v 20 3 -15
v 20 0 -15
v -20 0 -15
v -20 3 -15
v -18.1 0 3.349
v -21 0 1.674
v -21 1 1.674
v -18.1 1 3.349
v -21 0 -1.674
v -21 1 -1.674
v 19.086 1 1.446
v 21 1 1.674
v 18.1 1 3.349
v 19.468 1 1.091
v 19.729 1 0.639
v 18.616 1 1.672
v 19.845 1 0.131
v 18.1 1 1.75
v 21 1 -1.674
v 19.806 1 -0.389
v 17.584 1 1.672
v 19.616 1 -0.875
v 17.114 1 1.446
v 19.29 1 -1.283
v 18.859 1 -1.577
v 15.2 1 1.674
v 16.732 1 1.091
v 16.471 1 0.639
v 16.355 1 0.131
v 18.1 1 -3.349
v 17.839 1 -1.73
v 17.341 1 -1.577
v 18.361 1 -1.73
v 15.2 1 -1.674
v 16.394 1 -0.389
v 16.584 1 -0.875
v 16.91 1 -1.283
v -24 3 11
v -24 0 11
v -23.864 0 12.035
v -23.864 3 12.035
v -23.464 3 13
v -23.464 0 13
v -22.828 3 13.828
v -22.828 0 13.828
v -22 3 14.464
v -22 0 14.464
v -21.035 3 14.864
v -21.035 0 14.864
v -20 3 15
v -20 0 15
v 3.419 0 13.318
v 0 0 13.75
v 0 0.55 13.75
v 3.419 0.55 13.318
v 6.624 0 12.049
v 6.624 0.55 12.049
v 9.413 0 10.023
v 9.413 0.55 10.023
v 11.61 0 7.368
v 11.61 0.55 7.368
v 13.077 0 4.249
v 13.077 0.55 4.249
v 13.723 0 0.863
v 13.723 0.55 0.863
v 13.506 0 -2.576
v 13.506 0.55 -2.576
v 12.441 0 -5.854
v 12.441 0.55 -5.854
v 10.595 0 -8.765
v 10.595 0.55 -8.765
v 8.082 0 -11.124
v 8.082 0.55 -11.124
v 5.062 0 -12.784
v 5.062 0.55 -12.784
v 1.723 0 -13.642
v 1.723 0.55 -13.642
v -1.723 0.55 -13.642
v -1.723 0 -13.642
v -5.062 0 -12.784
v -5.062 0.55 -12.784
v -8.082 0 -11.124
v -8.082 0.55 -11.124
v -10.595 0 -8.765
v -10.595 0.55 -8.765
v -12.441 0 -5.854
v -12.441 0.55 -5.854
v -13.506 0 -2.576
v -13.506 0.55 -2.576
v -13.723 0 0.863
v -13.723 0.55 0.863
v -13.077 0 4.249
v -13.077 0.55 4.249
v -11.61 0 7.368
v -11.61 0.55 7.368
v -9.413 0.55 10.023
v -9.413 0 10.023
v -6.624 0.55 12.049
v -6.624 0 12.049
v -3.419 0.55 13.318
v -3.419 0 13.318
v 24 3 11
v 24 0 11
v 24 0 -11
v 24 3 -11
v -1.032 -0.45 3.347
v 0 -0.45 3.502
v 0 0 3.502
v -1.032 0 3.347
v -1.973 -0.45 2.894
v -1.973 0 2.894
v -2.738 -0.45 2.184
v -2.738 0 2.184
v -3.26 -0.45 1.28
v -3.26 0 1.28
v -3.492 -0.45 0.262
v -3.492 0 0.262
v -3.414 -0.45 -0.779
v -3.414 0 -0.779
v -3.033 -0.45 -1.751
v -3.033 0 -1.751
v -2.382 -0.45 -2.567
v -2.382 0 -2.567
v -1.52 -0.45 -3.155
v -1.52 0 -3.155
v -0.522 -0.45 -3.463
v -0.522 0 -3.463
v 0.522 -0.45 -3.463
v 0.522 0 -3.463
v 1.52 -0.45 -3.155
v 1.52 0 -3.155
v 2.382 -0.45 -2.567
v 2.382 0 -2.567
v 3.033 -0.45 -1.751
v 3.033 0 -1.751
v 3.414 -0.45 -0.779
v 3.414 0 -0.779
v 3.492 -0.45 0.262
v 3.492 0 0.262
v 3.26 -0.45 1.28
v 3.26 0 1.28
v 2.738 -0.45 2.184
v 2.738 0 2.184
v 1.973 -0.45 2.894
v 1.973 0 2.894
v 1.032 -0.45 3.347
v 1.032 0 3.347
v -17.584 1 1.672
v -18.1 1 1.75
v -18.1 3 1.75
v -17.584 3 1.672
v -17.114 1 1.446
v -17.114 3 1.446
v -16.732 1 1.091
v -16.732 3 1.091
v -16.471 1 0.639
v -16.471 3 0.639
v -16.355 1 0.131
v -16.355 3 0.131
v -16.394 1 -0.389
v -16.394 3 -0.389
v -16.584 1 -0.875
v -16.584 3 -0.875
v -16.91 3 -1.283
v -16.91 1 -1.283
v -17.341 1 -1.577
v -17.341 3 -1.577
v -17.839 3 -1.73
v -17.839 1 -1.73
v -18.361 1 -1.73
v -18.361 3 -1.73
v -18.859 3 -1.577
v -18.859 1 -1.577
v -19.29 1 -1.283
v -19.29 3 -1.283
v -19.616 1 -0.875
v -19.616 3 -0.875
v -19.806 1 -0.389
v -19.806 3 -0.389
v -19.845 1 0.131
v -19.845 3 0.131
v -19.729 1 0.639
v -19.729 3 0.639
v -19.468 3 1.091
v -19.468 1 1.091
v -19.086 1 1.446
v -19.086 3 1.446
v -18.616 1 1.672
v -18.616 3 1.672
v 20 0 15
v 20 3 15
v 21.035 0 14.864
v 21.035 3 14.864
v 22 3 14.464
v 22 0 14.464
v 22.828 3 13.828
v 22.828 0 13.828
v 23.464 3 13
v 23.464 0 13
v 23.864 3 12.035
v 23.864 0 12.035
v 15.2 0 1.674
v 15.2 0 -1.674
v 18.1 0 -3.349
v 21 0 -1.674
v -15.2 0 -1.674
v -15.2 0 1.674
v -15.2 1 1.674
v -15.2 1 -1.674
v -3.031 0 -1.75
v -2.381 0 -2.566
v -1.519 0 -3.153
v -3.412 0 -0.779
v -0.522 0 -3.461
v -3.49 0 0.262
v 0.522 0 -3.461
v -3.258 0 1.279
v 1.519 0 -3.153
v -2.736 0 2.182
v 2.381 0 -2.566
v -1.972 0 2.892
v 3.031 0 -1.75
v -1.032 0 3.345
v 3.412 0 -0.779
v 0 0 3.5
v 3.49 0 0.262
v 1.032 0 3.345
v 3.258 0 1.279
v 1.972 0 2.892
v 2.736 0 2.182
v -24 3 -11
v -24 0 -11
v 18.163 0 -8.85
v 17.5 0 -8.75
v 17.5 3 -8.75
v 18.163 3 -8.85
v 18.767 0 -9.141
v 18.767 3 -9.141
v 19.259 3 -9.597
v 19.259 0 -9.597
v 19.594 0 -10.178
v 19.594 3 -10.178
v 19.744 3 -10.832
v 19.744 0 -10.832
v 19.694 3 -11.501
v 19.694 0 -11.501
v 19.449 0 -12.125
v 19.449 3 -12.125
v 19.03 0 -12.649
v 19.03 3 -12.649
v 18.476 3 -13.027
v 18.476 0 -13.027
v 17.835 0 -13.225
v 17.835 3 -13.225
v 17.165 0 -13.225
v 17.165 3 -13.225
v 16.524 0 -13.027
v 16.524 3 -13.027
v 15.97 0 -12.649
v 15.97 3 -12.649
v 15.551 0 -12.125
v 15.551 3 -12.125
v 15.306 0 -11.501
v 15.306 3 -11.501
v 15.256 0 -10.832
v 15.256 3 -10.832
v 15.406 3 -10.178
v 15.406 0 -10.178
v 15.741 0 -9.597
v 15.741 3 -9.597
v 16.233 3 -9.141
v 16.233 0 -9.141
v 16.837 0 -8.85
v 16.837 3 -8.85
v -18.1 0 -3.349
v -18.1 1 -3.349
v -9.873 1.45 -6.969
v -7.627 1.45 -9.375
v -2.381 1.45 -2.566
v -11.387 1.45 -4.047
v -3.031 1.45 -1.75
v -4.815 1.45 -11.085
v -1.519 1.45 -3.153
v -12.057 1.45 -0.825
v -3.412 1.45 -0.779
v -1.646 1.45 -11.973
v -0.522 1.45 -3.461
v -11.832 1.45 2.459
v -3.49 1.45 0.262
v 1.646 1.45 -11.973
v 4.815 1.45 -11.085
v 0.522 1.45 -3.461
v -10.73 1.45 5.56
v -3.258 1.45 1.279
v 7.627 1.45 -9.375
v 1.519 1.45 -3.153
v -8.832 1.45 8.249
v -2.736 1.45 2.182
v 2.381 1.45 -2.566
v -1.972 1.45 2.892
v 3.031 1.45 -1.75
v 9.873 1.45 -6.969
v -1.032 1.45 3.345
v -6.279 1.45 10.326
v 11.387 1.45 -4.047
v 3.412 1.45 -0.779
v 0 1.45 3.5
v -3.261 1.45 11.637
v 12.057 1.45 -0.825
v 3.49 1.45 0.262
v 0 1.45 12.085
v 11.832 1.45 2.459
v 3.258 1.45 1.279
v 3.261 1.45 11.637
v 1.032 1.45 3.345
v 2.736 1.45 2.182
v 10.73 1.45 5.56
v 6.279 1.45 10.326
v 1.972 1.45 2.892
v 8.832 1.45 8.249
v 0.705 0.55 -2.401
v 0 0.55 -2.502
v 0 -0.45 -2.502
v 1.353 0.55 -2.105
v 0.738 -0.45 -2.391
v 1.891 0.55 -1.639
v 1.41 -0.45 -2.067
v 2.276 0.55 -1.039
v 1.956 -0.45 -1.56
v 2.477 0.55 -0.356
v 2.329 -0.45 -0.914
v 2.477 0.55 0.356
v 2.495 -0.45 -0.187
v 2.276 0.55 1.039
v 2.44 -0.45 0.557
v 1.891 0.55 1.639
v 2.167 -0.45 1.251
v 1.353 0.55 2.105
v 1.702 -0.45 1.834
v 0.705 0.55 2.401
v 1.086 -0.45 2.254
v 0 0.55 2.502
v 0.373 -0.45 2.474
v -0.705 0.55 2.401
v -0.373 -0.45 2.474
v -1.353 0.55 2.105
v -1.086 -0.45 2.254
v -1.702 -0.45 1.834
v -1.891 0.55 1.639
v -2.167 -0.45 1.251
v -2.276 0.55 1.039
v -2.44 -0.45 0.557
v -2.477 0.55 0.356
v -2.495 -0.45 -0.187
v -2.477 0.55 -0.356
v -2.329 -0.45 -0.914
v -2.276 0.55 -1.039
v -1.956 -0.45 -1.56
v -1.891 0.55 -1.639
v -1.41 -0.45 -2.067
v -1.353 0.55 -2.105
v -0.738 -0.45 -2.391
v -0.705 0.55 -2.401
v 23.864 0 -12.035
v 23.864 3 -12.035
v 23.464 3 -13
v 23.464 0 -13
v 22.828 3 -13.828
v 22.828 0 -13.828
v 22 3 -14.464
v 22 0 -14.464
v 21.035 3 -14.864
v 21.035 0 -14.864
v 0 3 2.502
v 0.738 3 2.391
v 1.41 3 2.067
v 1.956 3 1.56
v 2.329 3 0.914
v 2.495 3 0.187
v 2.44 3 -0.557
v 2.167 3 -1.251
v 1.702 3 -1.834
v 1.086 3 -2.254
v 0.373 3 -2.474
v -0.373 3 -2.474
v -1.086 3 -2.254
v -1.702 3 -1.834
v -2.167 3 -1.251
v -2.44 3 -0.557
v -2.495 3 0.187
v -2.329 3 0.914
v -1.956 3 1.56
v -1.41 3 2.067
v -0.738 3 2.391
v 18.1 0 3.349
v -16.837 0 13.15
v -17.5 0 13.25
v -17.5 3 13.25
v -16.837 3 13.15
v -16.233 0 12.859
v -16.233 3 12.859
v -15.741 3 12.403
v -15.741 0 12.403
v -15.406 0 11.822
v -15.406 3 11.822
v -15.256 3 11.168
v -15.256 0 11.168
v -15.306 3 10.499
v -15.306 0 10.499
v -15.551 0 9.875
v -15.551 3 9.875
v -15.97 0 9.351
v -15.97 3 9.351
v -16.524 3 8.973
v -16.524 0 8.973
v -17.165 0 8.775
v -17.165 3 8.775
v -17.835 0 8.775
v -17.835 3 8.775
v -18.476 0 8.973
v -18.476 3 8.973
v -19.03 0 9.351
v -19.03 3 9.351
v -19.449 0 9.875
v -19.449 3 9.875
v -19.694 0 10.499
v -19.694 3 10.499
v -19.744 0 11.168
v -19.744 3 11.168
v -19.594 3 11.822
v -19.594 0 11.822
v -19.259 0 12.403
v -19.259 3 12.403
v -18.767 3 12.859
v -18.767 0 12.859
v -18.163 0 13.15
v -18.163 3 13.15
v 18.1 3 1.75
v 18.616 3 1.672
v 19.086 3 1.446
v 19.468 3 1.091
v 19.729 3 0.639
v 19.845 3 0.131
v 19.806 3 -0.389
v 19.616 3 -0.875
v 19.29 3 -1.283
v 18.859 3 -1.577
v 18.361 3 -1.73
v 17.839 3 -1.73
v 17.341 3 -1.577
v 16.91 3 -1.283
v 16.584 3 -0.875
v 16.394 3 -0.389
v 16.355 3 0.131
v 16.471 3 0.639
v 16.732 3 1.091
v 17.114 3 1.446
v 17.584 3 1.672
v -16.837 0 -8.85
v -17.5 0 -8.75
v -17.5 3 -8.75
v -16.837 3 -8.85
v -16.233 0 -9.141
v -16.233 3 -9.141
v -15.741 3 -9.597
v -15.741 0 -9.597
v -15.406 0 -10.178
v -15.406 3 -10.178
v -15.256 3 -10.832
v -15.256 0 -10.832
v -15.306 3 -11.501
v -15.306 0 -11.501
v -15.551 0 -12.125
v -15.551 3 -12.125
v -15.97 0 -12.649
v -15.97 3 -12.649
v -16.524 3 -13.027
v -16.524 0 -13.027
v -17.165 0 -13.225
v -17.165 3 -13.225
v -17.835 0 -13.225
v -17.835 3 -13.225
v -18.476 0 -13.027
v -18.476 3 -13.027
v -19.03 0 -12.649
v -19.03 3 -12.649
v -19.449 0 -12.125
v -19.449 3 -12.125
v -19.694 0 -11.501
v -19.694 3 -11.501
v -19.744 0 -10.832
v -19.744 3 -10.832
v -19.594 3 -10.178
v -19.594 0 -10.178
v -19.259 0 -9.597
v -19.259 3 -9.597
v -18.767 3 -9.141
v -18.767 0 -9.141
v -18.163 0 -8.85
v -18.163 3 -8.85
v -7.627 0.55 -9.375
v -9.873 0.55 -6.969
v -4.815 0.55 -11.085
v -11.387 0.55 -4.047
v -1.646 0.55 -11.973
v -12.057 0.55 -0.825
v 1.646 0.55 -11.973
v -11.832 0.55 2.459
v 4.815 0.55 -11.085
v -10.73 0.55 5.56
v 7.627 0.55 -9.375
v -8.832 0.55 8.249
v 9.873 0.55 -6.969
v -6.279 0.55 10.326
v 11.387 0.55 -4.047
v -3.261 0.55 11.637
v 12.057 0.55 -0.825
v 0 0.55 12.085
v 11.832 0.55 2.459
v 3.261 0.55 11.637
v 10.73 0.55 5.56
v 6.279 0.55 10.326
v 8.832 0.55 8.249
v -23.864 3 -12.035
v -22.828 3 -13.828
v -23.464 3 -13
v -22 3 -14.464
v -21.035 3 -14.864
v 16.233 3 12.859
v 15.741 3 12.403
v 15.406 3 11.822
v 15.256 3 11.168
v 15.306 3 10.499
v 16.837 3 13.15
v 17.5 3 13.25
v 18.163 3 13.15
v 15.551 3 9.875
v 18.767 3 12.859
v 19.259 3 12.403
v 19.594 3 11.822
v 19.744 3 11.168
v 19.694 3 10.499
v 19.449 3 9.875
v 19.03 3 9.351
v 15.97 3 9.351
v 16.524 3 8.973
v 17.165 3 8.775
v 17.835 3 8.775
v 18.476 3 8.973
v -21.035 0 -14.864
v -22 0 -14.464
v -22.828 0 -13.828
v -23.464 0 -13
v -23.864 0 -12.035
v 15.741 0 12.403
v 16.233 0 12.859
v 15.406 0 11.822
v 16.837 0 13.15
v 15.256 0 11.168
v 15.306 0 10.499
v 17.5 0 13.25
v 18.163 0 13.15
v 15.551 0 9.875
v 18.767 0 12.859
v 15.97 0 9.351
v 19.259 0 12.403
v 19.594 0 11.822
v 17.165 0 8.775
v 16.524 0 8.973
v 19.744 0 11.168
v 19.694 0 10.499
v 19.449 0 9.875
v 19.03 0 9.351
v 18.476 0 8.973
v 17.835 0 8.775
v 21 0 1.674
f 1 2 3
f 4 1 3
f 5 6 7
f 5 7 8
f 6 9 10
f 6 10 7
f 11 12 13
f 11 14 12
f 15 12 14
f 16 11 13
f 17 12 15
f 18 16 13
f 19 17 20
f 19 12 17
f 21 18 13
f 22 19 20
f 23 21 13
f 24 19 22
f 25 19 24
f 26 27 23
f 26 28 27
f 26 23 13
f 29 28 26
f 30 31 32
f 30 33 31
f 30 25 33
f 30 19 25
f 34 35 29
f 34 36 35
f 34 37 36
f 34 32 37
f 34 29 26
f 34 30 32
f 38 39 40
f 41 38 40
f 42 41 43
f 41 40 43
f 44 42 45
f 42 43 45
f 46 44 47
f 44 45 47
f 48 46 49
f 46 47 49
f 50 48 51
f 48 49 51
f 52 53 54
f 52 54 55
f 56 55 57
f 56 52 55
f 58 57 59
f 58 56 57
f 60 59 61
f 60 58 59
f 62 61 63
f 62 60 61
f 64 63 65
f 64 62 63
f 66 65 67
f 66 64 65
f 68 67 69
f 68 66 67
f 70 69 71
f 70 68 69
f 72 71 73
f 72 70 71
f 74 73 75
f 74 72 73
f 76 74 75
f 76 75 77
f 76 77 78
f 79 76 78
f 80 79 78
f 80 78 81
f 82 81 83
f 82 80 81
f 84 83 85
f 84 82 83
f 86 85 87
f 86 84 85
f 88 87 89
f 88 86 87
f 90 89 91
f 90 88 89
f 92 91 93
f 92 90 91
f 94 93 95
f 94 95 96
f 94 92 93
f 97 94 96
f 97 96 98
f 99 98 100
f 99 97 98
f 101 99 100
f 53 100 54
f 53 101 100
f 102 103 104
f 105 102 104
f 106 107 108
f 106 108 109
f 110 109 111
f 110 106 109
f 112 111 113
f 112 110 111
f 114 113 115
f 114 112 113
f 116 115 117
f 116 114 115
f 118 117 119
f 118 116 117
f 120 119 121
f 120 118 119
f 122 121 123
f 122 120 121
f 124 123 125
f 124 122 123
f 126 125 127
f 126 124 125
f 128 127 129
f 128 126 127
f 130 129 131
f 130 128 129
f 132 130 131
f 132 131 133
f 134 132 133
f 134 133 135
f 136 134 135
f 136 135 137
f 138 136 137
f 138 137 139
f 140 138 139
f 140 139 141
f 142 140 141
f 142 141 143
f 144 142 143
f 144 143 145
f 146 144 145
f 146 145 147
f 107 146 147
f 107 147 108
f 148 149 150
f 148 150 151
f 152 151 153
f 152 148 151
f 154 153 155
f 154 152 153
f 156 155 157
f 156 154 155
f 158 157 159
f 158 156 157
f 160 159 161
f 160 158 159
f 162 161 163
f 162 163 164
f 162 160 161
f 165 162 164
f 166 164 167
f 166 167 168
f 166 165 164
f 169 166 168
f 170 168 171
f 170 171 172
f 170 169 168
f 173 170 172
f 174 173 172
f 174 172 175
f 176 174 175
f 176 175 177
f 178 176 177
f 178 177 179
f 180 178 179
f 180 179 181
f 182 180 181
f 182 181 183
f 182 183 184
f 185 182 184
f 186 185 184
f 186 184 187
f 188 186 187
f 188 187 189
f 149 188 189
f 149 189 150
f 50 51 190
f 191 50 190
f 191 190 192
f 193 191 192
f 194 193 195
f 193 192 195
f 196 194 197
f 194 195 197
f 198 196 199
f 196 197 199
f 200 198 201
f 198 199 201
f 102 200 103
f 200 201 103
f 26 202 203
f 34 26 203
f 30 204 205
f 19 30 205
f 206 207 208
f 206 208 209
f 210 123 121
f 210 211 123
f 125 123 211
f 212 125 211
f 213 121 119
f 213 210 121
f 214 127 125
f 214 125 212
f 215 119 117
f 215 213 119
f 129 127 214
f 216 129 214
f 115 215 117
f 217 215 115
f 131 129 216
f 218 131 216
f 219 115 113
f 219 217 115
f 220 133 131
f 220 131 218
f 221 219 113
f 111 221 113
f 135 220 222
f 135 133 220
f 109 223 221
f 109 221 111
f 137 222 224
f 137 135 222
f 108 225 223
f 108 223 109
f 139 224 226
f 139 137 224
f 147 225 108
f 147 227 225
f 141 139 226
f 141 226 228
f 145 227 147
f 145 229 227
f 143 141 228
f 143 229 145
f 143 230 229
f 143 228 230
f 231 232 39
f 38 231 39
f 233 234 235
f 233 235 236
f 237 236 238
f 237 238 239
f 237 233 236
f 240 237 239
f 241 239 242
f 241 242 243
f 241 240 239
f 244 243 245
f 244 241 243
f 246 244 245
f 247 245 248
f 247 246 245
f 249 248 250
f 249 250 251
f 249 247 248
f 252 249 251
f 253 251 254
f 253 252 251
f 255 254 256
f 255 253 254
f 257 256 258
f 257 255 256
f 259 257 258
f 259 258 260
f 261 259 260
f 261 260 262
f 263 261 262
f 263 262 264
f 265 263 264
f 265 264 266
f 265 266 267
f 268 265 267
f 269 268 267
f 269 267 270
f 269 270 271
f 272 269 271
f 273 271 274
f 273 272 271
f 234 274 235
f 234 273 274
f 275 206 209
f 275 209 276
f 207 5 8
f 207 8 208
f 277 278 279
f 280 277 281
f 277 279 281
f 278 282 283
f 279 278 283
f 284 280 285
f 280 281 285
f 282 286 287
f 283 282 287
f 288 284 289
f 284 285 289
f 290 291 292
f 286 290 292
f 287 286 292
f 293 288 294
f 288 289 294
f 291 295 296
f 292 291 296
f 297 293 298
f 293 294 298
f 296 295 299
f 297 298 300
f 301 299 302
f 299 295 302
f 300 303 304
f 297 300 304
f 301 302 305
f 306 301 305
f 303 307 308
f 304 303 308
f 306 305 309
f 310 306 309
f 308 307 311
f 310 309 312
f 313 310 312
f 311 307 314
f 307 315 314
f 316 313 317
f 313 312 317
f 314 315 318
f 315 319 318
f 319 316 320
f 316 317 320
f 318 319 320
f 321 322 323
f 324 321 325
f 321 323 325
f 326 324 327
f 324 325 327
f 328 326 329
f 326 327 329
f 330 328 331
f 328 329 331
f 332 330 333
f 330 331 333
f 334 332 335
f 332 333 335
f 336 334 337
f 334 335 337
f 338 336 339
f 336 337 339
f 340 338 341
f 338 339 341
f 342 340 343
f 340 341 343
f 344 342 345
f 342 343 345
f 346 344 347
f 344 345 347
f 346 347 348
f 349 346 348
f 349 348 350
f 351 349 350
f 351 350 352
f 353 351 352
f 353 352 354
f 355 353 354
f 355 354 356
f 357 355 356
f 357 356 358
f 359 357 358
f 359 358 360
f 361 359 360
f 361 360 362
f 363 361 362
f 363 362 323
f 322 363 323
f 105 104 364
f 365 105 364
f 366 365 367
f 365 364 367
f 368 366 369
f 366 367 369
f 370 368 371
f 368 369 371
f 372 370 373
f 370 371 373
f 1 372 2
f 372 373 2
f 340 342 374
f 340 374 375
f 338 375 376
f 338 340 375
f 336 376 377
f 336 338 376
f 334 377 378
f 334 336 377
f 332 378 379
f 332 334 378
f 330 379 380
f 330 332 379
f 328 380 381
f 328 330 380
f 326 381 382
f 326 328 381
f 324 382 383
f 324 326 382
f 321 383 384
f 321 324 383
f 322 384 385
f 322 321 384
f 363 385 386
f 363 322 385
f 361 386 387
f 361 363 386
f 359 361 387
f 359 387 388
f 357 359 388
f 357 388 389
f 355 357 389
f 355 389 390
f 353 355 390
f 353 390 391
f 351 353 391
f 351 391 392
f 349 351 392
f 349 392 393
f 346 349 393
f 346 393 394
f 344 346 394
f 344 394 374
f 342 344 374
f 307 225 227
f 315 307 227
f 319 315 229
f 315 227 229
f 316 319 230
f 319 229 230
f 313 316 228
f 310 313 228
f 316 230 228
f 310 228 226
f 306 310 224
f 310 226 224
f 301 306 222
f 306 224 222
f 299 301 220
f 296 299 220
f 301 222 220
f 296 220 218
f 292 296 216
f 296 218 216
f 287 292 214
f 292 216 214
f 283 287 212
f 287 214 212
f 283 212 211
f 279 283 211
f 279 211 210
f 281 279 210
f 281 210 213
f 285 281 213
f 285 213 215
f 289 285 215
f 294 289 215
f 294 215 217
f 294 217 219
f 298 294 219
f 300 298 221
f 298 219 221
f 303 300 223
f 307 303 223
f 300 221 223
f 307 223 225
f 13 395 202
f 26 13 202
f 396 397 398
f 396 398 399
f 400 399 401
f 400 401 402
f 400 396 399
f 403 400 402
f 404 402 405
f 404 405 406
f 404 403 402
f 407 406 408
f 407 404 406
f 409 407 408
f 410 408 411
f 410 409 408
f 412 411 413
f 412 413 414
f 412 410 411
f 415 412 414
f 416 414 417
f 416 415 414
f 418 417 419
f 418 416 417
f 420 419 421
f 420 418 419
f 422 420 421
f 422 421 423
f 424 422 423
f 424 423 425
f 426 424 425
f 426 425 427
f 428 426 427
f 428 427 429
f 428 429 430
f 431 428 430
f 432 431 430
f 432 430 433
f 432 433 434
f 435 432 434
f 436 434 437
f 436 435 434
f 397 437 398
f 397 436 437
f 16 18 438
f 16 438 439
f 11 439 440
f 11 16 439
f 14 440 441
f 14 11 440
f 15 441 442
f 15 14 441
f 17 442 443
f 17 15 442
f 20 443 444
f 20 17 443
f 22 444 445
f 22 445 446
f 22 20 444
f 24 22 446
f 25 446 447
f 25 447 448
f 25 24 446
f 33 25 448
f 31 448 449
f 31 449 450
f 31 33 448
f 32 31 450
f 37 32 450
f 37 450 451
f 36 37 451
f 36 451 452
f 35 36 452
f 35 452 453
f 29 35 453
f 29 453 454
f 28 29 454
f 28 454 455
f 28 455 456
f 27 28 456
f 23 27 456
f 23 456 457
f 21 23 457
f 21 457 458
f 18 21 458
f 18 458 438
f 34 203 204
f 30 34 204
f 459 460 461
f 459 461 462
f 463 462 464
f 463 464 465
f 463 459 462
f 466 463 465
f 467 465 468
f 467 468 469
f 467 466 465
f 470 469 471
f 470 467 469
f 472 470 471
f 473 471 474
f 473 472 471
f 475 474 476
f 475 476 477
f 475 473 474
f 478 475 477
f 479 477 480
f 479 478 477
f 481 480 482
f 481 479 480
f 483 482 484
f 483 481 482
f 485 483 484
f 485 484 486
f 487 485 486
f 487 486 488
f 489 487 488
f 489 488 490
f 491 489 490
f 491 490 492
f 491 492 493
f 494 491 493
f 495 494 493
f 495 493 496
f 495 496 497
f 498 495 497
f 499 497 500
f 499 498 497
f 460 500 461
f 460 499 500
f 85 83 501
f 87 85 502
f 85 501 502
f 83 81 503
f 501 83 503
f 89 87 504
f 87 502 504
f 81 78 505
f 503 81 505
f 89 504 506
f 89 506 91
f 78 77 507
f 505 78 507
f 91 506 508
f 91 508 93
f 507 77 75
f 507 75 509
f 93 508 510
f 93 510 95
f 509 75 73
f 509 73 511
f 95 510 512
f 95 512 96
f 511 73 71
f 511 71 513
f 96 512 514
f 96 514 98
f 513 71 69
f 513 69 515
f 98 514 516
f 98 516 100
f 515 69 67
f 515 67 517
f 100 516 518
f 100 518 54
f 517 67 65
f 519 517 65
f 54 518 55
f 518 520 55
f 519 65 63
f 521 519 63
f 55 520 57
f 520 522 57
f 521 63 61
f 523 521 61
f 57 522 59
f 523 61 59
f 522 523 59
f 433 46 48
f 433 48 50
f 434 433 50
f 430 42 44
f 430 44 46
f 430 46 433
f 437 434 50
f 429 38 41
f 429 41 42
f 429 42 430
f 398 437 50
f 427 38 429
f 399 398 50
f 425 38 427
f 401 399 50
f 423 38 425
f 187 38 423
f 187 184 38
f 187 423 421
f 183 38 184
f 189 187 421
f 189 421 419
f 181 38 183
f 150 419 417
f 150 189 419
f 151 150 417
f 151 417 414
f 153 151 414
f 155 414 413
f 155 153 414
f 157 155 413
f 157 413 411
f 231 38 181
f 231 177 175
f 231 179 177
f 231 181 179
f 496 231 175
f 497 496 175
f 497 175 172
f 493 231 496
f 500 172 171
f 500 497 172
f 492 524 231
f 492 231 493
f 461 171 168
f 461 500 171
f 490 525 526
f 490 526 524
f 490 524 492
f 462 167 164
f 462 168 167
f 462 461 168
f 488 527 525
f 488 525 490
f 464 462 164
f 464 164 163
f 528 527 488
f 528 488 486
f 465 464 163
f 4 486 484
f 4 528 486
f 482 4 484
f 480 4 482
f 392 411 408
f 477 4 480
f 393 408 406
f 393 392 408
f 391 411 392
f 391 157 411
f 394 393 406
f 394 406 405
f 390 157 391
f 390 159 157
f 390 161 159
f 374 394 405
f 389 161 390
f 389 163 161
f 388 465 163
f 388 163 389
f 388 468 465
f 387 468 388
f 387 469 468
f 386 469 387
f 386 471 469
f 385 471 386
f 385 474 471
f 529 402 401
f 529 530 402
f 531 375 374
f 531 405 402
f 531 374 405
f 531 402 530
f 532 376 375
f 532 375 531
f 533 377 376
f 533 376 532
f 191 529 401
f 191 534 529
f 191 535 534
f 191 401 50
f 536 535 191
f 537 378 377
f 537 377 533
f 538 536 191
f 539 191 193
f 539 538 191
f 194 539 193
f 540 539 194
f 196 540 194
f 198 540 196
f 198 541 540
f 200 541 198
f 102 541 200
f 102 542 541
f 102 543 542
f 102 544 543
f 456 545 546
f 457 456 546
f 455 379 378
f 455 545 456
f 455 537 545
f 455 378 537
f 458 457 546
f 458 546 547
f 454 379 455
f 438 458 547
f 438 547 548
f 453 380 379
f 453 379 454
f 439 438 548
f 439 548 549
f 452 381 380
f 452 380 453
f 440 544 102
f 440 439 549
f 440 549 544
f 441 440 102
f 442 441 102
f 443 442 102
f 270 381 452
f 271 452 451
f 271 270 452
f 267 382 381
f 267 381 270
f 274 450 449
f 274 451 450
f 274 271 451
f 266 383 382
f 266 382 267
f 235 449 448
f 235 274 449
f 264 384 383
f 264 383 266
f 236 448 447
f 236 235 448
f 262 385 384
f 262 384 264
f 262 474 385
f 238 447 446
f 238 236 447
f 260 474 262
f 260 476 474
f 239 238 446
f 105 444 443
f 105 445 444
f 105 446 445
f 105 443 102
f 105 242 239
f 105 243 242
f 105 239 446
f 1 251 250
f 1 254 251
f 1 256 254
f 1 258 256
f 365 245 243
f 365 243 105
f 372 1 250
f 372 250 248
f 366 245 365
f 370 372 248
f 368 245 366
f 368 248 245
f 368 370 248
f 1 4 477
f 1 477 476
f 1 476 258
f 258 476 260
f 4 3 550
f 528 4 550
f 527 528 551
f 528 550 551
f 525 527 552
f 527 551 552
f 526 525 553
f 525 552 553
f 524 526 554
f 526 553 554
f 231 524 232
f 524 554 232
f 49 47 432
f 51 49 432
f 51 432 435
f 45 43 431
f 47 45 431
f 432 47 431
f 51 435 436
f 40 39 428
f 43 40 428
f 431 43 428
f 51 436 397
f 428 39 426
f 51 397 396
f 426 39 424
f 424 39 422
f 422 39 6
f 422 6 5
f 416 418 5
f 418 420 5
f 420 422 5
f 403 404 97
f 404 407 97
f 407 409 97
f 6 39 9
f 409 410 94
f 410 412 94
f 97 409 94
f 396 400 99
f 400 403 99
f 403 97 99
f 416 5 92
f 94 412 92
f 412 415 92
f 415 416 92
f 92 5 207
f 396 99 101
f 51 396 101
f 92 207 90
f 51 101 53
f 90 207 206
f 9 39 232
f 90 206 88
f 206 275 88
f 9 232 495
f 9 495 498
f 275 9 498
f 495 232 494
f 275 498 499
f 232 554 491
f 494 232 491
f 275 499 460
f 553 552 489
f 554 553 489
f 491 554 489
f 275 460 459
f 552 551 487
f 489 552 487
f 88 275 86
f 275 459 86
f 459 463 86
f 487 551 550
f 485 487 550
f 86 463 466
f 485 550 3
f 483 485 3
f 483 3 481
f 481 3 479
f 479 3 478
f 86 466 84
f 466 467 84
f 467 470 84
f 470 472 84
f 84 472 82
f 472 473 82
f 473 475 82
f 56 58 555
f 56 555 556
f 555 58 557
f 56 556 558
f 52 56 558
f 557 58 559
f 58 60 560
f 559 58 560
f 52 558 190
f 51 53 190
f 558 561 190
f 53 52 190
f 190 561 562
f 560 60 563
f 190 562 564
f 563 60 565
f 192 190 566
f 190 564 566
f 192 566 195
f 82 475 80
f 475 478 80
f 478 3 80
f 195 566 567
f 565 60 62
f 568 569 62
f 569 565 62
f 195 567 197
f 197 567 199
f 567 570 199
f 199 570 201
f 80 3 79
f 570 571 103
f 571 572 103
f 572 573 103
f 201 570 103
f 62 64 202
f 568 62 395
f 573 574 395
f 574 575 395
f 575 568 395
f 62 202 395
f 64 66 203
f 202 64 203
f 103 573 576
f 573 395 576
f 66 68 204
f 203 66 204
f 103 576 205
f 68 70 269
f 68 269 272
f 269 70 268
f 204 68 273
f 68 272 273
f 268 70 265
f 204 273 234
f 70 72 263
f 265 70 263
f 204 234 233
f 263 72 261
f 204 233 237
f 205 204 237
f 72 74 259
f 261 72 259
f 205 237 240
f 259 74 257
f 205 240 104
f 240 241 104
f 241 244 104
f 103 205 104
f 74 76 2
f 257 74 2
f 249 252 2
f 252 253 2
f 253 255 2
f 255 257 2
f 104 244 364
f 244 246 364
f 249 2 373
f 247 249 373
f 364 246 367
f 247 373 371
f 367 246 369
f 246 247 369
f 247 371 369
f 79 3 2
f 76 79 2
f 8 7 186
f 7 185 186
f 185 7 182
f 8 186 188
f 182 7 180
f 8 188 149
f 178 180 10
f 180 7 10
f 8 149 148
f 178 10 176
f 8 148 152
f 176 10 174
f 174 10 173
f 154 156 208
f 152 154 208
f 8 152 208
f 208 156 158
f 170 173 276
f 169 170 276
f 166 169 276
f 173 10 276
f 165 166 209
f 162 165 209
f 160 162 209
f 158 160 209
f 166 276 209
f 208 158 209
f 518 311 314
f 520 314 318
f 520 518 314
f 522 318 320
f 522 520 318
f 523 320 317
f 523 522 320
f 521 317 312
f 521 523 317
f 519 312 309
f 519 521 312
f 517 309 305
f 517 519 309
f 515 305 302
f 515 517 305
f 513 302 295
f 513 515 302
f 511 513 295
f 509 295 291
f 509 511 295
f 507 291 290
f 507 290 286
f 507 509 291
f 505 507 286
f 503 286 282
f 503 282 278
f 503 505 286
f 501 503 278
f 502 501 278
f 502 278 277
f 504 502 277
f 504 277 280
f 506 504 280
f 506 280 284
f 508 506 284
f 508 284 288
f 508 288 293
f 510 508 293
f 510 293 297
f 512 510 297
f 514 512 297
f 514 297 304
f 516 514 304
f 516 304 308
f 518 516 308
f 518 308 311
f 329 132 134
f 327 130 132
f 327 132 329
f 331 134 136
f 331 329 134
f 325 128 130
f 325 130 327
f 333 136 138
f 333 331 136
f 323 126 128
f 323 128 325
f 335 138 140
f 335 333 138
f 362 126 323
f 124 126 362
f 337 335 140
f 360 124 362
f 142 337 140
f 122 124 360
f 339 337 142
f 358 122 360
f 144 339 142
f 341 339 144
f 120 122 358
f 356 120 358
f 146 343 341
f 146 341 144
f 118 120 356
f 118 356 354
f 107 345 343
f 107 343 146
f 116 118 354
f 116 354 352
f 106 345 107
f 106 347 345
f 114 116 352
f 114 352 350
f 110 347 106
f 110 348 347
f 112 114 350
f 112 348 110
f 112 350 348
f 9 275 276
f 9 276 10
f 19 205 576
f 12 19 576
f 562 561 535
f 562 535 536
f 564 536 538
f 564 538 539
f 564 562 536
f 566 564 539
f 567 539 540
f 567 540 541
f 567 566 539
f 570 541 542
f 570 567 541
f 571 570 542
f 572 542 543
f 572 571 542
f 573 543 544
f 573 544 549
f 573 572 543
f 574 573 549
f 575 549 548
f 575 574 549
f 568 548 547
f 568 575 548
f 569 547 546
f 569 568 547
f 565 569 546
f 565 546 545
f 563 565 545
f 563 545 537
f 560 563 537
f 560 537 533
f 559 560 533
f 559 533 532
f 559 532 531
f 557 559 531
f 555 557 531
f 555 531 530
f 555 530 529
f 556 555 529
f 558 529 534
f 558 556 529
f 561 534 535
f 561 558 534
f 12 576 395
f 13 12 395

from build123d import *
from build123d.topology import SkipClean

# Parameters (mm, degrees)
ESBO_O1_R                = 2.502267334
ESBO_O1_R_2              = 2.25
ESBO_O1_R_3              = 1.75
RESSALTO_EXTRUS_O1_DEPTH = 3
CORTE_EXTRUS_O1_DEPTH    = 1
ESBO_O1_4_R              = 13.75
CORTE_EXTRUS_O3_DEPTH    = 0.55
RESSALTO_EXTRUS_O2_START = 1
ESBO_O2_R                = 3.502267334
ESBO_O2_R_2              = 2.502267334
RESSALTO_EXTRUS_O2_DEPTH = 1
ESBO_O1_5_R              = 12.085266094
ESBO_O1_5_R_2            = 3.5
CORTE_EXTRUS_O4_DEPTH    = 1.45


with BuildPart() as part:
    # Esboço1 → Ressalto-extrusão1 (new body)
    with BuildSketch(Plane(origin=(0, 0, 0), x_dir=(1, 0, 0), z_dir=(0, 1, 0))):
        with BuildLine():
            Line((-20, -15), (20, -15))
            ThreePointArc((20, -15), (22.828427125, -13.828427125), (24, -11))
            Line((24, -11), (24, 11))
            ThreePointArc((24, 11), (22.828427125, 13.828427125), (20, 15))
            Line((20, 15), (-20, 15))
            ThreePointArc((-20, 15), (-22.828427125, 13.828427125), (-24, 11))
            Line((-24, 11), (-24, -11))
            ThreePointArc((-24, -11), (-22.828427125, -13.828427125), (-20, -15))
        make_face()
        with Locations(Location((0, 0, 0), (0, 0, 270))):
            Circle(ESBO_O1_R, mode=Mode.SUBTRACT)
        with Locations(Location((-17.5, -11, 0), (0, 0, 270))):
            Circle(ESBO_O1_R_2, mode=Mode.SUBTRACT)
        with Locations(Location((-17.5, 11, 0), (0, 0, 270))):
            Circle(ESBO_O1_R_2, mode=Mode.SUBTRACT)
        with Locations(Location((17.5, -11, 0), (0, 0, 270))):
            Circle(ESBO_O1_R_2, mode=Mode.SUBTRACT)
        with Locations(Location((17.5, 11, 0), (0, 0, 270))):
            Circle(ESBO_O1_R_2, mode=Mode.SUBTRACT)
        with Locations(Location((-18.1, 0, 0), (0, 0, 270))):
            Circle(ESBO_O1_R_3, mode=Mode.SUBTRACT)
        with Locations(Location((18.1, 0, 0), (0, 0, 270))):
            Circle(ESBO_O1_R_3, mode=Mode.SUBTRACT)
    extrude(amount=RESSALTO_EXTRUS_O1_DEPTH)

    # Esboço1<3> → Corte-extrusão1 (cut)
    with BuildSketch(Plane(origin=(0, 0, 0), x_dir=(1, 0, 0), z_dir=(0, 1, 0))):
        Polygon((-21, 1.674315781), (-21, -1.674315781), (-18.1, -3.348631561), (-15.2, -1.674315781), (-15.2, 1.674315781), (-18.1, 3.348631561), align=None)
        Polygon((18.1, -3.348631561), (15.2, -1.674315781), (15.2, 1.674315781), (18.1, 3.348631561), (21, 1.674315781), (21, -1.674315781), align=None)
    extrude(amount=CORTE_EXTRUS_O1_DEPTH, mode=Mode.SUBTRACT)

    # Esboço1<4> → Corte-extrusão3 (cut)
    with BuildSketch(Plane(origin=(0, 0, 0), x_dir=(1, 0, 0), z_dir=(0, 1, 0))):
        with Locations(Location((0, 0, 0), (0, 0, 270))):
            Circle(ESBO_O1_4_R)
    extrude(amount=CORTE_EXTRUS_O3_DEPTH, mode=Mode.SUBTRACT)

    # Esboço2 → Ressalto-extrusão2 (add)
    with SkipClean():  # the faces are left unmerged after this step: merging them gives an invalid solid
        with BuildSketch(Plane.XZ.offset(-0.55).offset(RESSALTO_EXTRUS_O2_START)):
            with Locations(Location((0, 0, 0), (0, 0, 90))):
                Circle(ESBO_O2_R)
            with Locations(Location((0, 0, 0), (0, 0, 270))):
                Circle(ESBO_O2_R_2, mode=Mode.SUBTRACT)
        extrude(amount=-RESSALTO_EXTRUS_O2_DEPTH)

    # Esboço1<5> → Corte-extrusão4 (cut)
    with SkipClean():  # the faces are left unmerged after this step: merging them gives an invalid solid
        with BuildSketch(Plane(origin=(0, 0, 0), x_dir=(1, 0, 0), z_dir=(0, 1, 0))):
            with Locations(Location((0, 0, 0), (0, 0, 270))):
                Circle(ESBO_O1_5_R)
            with Locations(Location((0, 0, 0), (0, 0, 270))):
                Circle(ESBO_O1_5_R_2, mode=Mode.SUBTRACT)
        extrude(amount=CORTE_EXTRUS_O4_DEPTH, mode=Mode.SUBTRACT)


solid = part.part
